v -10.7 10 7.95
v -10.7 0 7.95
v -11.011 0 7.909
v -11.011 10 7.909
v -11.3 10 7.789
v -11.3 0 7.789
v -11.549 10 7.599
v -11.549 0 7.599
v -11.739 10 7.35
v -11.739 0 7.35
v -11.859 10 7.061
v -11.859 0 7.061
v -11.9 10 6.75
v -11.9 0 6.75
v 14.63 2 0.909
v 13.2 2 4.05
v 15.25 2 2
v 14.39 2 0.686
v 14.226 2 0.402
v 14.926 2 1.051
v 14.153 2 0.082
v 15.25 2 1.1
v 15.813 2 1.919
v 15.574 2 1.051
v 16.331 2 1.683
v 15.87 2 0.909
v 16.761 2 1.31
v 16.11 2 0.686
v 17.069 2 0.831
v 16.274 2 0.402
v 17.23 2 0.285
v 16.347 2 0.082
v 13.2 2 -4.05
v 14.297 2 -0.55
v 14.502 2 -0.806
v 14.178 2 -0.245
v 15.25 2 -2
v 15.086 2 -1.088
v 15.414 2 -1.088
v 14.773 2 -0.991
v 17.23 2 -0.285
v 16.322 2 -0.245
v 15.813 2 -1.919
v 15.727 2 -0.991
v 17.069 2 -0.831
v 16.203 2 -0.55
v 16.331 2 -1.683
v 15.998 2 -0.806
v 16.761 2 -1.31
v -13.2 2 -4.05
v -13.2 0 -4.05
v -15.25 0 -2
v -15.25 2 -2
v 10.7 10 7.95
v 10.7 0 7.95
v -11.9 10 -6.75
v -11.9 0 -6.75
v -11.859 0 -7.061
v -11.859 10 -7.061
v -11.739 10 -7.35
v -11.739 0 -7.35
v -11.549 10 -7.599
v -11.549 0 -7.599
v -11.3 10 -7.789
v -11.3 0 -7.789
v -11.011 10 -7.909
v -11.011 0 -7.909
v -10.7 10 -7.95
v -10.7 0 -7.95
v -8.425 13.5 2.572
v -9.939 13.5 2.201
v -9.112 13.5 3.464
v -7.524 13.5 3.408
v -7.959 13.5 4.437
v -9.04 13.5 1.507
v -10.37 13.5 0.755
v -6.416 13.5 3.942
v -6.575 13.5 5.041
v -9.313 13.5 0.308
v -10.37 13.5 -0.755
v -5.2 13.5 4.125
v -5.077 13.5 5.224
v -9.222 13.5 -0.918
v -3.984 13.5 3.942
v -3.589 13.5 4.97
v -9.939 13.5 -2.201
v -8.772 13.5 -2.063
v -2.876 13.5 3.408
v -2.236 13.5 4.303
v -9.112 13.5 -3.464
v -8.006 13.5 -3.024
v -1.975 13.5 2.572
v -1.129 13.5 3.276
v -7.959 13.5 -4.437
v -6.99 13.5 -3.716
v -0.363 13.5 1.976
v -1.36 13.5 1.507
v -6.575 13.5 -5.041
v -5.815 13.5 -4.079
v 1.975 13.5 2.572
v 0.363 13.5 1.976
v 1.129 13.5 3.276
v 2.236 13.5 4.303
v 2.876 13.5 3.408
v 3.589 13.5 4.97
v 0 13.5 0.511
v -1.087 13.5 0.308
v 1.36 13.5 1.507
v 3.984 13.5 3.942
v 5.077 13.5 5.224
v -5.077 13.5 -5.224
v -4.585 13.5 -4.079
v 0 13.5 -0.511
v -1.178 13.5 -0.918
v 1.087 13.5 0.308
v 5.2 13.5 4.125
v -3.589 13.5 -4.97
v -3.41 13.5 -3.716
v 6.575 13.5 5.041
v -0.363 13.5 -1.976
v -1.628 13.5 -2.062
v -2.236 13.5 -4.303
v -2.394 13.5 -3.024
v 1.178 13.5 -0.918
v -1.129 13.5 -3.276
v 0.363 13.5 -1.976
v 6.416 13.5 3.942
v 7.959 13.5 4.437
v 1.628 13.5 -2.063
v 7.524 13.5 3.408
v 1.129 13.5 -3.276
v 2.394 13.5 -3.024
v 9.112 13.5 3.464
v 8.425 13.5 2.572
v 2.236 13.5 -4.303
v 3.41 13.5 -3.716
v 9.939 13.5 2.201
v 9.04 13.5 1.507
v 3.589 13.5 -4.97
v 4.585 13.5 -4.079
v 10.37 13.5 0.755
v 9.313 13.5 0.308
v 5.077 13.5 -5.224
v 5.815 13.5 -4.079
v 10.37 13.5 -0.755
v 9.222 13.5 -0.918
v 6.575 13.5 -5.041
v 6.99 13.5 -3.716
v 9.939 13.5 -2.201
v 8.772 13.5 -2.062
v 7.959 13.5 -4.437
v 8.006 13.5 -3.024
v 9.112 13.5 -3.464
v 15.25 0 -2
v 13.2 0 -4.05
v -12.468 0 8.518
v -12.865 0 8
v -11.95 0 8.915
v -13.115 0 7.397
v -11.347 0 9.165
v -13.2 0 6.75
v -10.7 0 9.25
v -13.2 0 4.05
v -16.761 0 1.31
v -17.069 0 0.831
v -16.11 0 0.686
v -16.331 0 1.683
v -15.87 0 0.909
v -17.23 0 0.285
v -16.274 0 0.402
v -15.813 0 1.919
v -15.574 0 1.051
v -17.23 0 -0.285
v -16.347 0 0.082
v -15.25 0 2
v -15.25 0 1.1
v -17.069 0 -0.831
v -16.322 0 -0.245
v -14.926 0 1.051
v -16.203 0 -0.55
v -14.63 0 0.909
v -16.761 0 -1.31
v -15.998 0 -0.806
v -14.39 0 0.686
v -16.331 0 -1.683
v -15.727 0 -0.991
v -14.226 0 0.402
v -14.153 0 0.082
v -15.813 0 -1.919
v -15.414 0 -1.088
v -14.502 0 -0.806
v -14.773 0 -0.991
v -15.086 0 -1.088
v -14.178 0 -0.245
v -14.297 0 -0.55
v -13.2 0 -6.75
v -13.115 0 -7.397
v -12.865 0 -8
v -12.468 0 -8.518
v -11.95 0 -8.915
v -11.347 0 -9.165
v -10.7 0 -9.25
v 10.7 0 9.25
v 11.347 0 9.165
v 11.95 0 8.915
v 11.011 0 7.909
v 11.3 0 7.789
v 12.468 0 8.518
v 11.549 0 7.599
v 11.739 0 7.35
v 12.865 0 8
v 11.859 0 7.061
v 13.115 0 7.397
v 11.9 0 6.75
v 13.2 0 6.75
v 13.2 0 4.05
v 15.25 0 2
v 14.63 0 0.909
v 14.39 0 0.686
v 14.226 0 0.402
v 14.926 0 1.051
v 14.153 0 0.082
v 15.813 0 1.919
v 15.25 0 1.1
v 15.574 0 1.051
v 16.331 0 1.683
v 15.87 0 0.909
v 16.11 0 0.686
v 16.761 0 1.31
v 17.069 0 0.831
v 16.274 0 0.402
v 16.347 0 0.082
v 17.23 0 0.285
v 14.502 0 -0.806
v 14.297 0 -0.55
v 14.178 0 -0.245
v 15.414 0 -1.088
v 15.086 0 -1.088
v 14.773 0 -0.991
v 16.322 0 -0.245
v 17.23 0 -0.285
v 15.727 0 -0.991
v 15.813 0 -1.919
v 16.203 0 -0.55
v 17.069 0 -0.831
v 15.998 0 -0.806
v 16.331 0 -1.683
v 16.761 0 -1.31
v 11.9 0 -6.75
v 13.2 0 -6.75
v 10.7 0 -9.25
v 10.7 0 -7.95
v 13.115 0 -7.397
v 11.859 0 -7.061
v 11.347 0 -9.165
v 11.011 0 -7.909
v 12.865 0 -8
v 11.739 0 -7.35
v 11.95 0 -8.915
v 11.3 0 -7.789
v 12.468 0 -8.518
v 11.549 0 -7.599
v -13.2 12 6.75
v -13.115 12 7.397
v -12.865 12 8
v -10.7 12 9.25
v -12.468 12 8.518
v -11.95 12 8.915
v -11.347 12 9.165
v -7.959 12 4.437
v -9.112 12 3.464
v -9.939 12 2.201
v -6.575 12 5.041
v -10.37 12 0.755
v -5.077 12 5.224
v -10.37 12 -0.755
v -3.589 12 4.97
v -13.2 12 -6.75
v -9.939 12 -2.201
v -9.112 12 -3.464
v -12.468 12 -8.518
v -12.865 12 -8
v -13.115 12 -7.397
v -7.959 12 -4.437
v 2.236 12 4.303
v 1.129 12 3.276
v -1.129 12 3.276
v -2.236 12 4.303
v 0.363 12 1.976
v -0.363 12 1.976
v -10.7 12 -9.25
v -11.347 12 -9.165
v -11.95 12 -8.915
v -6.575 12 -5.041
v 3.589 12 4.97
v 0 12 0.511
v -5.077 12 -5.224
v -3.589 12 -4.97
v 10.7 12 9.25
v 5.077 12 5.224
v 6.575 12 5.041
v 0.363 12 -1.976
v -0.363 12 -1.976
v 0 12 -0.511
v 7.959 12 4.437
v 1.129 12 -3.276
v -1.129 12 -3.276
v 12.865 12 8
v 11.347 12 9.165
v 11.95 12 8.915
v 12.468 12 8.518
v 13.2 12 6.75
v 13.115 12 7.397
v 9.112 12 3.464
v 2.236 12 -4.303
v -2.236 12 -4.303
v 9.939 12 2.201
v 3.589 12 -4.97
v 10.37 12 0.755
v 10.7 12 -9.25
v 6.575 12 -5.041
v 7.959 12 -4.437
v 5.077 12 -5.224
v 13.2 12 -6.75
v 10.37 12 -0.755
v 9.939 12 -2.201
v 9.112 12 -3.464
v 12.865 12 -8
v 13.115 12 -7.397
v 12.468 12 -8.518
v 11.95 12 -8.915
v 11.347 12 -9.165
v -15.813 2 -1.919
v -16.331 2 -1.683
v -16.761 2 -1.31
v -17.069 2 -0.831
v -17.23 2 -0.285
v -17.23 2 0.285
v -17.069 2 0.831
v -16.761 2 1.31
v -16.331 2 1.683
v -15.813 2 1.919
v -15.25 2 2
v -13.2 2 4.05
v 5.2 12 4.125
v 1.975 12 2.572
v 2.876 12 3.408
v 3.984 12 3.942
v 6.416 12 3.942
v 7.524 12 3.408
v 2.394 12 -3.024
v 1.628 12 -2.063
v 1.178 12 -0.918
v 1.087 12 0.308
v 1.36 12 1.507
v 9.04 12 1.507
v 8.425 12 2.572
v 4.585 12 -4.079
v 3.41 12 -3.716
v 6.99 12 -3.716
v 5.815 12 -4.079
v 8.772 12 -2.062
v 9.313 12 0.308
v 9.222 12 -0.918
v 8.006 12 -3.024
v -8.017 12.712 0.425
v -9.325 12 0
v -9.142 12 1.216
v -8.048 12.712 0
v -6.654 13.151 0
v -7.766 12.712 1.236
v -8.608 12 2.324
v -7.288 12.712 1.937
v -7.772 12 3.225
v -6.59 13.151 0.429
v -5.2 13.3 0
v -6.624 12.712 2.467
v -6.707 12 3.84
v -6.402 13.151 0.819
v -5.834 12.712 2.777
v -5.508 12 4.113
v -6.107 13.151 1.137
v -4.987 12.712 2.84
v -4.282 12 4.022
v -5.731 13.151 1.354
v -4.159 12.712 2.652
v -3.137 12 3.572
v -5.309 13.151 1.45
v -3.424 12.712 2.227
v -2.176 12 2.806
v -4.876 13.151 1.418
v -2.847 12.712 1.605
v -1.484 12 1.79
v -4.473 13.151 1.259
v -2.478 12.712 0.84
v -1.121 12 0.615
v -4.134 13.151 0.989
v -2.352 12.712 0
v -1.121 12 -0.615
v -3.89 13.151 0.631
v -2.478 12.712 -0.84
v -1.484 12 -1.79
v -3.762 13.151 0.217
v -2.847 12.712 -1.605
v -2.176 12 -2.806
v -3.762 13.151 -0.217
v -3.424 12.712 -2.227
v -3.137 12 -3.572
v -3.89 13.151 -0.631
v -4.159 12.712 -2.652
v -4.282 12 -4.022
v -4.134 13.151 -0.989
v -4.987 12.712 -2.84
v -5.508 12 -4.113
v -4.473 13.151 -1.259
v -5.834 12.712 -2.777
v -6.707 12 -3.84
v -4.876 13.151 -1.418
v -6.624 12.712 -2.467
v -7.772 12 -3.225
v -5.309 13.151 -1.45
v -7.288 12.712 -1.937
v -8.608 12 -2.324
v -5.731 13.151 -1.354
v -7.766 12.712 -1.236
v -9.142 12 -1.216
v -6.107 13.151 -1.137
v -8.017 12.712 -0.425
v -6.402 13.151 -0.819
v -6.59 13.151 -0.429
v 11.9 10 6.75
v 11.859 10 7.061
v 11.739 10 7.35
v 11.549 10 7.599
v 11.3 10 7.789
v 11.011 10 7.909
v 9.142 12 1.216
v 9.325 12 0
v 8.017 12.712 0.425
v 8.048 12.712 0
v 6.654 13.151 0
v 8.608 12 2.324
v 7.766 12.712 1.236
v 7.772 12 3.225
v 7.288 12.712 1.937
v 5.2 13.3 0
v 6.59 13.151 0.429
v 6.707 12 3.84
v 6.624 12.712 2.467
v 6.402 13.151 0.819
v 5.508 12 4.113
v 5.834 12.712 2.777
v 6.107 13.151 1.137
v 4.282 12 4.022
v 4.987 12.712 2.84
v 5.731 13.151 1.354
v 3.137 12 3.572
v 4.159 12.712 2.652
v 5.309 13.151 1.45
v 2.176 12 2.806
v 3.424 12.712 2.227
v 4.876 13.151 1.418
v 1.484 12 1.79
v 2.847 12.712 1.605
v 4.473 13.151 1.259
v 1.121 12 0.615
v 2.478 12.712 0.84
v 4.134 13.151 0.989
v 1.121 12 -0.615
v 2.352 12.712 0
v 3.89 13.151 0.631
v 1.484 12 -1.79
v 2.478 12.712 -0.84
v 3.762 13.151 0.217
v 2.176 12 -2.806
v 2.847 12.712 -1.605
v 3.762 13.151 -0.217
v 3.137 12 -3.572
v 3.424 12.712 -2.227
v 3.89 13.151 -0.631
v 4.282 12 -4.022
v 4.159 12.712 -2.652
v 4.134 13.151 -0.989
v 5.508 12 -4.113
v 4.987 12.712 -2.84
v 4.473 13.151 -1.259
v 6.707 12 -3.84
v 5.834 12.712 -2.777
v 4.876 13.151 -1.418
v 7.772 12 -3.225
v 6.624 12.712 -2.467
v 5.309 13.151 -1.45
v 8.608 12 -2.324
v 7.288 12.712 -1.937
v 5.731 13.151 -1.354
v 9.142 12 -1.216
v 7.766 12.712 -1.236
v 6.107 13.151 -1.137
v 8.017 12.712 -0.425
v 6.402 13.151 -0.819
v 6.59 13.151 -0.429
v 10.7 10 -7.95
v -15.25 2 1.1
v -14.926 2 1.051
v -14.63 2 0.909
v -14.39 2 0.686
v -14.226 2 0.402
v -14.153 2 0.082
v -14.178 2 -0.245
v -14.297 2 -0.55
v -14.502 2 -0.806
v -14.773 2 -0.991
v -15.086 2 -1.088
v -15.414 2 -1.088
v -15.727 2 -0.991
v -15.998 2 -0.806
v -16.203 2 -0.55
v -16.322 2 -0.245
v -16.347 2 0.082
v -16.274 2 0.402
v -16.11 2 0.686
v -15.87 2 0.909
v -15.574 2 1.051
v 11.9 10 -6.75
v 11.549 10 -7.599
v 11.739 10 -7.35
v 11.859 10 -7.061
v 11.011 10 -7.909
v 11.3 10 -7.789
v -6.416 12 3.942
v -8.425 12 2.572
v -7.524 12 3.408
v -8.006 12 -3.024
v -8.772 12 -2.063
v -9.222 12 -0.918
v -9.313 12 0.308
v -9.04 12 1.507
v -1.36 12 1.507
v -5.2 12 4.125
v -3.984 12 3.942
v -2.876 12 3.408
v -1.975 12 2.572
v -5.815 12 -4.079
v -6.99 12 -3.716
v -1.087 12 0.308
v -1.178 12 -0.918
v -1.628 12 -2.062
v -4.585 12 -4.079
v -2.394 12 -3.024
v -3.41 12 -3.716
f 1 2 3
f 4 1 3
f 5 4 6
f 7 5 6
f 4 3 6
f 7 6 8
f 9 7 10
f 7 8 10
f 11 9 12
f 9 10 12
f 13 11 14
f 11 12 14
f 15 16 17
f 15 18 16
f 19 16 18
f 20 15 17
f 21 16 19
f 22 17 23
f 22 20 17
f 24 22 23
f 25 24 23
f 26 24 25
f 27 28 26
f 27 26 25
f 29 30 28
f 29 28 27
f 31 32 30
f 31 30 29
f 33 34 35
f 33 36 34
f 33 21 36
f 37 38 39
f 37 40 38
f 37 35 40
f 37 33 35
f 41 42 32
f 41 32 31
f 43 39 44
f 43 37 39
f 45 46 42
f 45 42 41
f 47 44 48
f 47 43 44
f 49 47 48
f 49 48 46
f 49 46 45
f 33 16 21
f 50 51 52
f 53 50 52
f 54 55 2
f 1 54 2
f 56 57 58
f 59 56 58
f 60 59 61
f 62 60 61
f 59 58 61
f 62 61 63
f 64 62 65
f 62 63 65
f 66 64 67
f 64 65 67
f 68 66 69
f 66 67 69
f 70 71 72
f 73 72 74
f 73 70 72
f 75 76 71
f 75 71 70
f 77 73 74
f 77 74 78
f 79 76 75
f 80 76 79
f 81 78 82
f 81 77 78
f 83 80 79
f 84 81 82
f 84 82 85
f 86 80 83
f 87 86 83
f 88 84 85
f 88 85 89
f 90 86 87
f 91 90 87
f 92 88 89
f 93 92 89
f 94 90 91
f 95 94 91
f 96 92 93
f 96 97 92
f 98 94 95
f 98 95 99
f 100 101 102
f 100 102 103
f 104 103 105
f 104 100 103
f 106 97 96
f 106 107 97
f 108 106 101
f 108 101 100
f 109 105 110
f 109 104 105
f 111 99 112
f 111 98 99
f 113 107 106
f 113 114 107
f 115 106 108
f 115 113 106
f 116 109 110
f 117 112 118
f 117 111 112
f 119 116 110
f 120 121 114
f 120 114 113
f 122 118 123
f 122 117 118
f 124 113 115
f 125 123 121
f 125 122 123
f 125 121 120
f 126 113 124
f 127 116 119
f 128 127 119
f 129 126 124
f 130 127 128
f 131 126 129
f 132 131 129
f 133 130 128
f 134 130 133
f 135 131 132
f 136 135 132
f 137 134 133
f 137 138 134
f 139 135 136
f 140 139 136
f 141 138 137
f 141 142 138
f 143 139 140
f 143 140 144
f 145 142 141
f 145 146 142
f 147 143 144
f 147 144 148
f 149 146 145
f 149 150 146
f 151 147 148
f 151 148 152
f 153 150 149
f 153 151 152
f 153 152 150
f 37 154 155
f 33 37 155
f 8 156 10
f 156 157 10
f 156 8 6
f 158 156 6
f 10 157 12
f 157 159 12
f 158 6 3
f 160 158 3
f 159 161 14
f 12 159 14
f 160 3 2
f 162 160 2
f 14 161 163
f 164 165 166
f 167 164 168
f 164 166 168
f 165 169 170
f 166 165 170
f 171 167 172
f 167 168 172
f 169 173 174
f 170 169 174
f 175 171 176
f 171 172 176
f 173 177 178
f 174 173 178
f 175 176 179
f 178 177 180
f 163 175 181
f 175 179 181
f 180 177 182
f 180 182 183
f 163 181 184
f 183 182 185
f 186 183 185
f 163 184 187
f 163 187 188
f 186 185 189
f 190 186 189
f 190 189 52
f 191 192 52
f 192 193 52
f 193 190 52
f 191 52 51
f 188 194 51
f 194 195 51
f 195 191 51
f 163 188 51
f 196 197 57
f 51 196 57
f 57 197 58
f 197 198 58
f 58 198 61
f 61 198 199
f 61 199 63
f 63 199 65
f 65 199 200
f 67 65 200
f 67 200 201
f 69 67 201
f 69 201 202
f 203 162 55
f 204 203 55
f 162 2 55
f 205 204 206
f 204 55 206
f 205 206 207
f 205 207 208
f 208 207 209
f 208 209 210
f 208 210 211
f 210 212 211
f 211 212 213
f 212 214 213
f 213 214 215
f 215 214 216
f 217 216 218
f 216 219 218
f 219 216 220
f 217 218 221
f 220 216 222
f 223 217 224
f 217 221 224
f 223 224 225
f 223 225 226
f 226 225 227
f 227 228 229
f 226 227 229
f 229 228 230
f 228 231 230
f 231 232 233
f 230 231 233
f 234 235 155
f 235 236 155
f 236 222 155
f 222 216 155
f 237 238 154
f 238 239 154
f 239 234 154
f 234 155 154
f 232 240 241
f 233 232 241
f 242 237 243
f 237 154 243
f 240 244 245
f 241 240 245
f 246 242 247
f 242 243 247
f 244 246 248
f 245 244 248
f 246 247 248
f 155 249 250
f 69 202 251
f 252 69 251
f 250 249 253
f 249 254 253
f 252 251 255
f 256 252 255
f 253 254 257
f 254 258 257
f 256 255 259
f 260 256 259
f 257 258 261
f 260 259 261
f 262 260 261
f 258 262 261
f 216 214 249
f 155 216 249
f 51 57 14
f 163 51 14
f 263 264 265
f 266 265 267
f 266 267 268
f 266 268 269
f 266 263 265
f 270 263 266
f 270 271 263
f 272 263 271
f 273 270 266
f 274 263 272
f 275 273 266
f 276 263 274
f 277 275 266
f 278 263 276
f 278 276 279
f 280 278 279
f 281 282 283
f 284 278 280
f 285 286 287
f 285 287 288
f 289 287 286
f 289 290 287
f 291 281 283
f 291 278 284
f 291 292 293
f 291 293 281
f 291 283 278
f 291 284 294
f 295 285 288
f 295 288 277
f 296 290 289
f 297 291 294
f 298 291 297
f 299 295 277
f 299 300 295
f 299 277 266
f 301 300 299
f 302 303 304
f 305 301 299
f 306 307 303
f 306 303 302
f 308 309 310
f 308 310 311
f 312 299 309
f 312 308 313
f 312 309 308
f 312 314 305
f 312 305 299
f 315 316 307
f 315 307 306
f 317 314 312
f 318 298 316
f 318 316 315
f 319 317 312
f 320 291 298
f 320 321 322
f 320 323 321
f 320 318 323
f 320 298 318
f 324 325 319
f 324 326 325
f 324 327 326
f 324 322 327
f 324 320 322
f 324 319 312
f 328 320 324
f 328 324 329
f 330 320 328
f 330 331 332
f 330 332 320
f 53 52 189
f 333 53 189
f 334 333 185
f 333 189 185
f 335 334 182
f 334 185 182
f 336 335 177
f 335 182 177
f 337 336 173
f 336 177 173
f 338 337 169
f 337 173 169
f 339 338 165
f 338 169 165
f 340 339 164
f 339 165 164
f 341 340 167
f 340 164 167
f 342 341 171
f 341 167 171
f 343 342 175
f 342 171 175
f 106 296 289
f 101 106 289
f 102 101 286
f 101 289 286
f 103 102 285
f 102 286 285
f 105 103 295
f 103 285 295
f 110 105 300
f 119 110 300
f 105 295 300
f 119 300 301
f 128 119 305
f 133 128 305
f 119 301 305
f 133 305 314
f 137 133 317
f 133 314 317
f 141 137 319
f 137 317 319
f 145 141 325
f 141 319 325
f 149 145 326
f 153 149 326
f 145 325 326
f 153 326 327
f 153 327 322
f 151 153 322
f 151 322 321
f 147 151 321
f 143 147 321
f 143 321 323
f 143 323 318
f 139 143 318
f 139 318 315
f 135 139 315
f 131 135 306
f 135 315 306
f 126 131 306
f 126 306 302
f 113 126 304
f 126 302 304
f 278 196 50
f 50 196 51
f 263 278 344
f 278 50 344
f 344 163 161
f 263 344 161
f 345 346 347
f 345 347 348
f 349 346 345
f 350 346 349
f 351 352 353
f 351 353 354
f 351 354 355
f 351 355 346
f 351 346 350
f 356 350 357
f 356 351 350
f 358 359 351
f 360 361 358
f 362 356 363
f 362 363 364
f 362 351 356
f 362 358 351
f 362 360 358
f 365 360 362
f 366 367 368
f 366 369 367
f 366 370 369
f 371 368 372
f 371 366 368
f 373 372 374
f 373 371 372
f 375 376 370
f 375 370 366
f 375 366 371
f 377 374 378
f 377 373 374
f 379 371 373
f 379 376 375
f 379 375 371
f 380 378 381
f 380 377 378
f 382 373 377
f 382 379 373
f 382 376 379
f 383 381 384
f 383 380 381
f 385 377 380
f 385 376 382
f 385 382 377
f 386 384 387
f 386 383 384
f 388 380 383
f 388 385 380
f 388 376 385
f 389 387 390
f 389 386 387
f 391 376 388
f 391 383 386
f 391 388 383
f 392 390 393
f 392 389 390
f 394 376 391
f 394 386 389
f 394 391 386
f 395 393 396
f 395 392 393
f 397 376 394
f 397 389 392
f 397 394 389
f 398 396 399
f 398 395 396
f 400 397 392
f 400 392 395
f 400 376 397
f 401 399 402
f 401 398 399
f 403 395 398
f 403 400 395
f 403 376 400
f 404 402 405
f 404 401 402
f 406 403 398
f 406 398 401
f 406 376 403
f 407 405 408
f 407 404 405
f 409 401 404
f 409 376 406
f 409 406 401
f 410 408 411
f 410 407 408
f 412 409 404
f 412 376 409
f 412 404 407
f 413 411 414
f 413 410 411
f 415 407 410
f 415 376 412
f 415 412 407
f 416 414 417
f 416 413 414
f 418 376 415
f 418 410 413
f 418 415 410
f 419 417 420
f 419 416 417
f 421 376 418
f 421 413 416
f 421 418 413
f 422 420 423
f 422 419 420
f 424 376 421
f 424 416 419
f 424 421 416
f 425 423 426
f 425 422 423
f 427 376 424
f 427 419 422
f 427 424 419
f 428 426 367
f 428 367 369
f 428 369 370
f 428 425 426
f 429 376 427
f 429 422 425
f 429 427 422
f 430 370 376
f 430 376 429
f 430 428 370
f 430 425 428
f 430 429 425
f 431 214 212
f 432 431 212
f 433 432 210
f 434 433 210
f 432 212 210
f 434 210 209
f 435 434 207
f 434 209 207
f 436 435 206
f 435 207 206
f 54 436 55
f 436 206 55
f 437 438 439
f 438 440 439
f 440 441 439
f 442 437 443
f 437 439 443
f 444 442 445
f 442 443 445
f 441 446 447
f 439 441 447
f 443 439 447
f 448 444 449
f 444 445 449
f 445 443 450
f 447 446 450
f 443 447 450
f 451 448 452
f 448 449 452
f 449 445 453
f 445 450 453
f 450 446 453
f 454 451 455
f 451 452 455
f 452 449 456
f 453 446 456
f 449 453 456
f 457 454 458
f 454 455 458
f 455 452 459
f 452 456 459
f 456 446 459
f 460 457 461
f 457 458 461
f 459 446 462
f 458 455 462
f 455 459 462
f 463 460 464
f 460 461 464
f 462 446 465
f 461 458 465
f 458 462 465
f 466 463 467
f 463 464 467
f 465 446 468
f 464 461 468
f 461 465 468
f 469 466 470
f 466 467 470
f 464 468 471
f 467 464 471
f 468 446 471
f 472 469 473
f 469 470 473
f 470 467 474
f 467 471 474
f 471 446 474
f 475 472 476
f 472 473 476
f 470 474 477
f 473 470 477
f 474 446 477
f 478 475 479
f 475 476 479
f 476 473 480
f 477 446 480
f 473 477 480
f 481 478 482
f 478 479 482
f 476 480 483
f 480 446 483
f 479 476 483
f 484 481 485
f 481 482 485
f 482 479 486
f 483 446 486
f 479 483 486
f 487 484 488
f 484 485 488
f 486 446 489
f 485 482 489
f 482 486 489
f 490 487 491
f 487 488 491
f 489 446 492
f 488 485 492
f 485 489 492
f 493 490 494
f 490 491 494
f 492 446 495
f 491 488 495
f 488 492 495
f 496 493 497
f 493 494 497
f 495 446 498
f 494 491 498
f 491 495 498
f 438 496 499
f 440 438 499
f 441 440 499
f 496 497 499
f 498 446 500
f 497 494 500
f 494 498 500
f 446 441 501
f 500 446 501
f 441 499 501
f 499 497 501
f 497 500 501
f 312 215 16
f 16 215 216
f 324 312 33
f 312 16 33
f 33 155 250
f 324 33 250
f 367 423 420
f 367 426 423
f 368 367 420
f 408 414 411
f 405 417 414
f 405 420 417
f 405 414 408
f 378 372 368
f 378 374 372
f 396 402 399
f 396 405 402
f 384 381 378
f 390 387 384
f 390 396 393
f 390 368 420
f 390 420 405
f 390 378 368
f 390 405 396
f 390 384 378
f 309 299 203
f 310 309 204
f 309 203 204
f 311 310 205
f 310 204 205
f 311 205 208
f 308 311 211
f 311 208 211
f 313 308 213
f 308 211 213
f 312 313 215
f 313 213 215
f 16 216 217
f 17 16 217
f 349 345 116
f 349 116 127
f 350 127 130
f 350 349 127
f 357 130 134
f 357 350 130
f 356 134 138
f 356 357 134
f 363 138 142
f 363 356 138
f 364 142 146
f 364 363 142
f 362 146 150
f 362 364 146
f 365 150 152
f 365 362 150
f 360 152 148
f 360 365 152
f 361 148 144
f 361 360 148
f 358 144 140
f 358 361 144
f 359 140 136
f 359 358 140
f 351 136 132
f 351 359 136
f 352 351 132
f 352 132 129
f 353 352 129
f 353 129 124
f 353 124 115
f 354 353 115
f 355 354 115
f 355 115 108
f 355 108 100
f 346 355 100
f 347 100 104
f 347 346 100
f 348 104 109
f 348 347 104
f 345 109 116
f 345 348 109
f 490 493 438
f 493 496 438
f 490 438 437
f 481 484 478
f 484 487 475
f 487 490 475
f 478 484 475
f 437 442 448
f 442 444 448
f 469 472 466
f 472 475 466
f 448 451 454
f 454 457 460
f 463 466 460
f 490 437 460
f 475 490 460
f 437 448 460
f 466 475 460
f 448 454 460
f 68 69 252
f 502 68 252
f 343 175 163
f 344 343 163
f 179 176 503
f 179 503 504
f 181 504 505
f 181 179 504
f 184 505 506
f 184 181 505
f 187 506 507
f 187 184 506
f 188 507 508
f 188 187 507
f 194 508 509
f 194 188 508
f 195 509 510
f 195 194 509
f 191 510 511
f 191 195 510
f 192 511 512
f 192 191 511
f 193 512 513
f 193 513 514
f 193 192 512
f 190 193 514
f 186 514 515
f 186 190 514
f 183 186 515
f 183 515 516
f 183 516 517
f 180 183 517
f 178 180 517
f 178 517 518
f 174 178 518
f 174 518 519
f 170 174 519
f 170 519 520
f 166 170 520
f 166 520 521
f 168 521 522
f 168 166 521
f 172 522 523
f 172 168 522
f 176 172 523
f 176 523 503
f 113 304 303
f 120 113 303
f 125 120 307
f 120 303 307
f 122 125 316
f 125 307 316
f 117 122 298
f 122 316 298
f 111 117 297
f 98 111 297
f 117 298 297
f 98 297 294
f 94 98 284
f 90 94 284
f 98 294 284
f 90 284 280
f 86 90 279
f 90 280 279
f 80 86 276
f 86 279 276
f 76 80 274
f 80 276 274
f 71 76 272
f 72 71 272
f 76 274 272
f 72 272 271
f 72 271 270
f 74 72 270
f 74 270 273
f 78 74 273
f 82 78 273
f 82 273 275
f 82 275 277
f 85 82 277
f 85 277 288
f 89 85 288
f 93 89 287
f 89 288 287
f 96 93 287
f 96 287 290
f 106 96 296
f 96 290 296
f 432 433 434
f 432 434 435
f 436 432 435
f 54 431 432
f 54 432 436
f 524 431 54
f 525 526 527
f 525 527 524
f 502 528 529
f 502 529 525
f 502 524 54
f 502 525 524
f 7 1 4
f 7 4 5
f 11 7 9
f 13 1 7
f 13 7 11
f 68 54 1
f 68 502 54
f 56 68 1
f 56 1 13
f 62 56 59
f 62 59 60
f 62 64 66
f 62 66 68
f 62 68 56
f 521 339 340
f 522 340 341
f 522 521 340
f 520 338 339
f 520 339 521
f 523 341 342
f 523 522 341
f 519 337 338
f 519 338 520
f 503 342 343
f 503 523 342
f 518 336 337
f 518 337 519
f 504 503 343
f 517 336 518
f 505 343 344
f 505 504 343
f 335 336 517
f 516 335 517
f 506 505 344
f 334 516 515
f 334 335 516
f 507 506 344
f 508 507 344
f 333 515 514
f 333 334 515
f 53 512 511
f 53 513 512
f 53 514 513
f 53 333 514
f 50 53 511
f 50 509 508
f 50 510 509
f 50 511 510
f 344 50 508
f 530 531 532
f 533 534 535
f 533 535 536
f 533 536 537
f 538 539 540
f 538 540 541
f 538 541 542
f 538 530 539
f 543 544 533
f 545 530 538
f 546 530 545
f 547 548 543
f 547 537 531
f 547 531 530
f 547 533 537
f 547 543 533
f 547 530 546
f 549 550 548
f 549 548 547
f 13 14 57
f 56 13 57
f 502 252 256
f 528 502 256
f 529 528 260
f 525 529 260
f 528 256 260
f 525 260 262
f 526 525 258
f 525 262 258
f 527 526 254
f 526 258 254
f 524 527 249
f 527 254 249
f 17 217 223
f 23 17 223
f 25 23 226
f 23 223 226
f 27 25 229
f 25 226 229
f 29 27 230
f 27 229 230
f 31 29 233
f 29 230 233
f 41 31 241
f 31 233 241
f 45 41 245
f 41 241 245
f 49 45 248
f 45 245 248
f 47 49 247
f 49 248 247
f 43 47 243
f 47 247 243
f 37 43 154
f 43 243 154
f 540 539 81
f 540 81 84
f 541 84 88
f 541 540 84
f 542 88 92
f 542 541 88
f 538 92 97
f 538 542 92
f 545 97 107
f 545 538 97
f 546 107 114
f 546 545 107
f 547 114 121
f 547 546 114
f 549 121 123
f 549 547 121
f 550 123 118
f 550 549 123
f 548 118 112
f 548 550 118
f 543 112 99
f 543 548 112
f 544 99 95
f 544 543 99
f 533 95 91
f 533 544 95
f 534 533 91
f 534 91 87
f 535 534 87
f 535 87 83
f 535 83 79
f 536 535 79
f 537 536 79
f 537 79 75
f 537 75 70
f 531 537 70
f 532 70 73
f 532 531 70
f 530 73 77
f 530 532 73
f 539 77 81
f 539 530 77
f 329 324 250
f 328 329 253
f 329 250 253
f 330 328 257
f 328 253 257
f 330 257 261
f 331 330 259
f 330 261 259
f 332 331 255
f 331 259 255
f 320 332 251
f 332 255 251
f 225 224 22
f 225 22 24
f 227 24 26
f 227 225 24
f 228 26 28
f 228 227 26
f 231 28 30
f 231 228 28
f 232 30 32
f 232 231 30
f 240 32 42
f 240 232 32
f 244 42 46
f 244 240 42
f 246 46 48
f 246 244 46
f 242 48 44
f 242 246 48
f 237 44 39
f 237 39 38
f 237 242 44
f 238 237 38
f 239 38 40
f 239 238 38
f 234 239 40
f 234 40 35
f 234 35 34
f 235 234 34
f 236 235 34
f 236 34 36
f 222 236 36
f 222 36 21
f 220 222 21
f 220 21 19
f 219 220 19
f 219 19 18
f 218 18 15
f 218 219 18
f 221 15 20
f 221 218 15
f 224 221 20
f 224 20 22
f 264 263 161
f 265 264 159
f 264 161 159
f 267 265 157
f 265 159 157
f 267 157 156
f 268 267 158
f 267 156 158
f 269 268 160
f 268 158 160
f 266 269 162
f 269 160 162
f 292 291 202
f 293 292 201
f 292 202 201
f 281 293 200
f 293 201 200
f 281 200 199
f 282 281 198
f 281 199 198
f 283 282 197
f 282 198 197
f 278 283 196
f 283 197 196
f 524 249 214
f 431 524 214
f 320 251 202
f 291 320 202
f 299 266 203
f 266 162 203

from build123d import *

# Parameters (mm, degrees)
SKETCH2_R           = 1.1
BOSS_EXTRUDE1_DEPTH = 2
BOSS_EXTRUDE2_DEPTH = 10
BOSS_EXTRUDE3_START = -2
BOSS_EXTRUDE3_DEPTH = 2
SKETCH5_R           = 4.125
BOSS_EXTRUDE4_DEPTH = 1.5


with BuildPart() as part:
    # Sketch2 → Boss-Extrude1 (new body)
    with BuildSketch(Plane(origin=(0, 0, 0), x_dir=(1, 0, 0), z_dir=(0, 1, 0))):
        with BuildLine():
            Line((-10.7, -9.25), (10.7, -9.25))
            ThreePointArc((10.7, -9.25), (12.467766953, -8.517766953), (13.2, -6.75))
            Line((13.2, -6.75), (13.2, -4.05))
            Line((13.2, -4.05), (15.25, -2))
            ThreePointArc((15.25, -2), (17.25, 0), (15.25, 2))
            Line((15.25, 2), (13.2, 4.05))
            Line((13.2, 4.05), (13.2, 6.75))
            ThreePointArc((13.2, 6.75), (12.467766953, 8.517766953), (10.7, 9.25))
            Line((10.7, 9.25), (-10.7, 9.25))
            ThreePointArc((-10.7, 9.25), (-12.467766953, 8.517766953), (-13.2, 6.75))
            Line((-13.2, 6.75), (-13.2, 4.05))
            Line((-13.2, 4.05), (-15.25, 2))
            ThreePointArc((-15.25, 2), (-17.25, 0), (-15.25, -2))
            Line((-15.25, -2), (-13.2, -4.05))
            Line((-13.2, -4.05), (-13.2, -6.75))
            ThreePointArc((-13.2, -6.75), (-12.467766953, -8.517766953), (-10.7, -9.25))
        make_face()
        with Locations(Location((-15.25, 0, 0), (0, 0, 270))):
            Circle(SKETCH2_R, mode=Mode.SUBTRACT)
        with Locations(Location((15.25, 0, 0), (0, 0, 270))):
            Circle(SKETCH2_R, mode=Mode.SUBTRACT)
        with BuildLine():
            Line((-10.7, 7.95), (10.7, 7.95))
            ThreePointArc((10.7, 7.95), (11.548528137, 7.598528137), (11.9, 6.75))
            Line((11.9, 6.75), (11.9, -6.75))
            ThreePointArc((11.9, -6.75), (11.548528137, -7.598528137), (10.7, -7.95))
            Line((10.7, -7.95), (-10.7, -7.95))
            ThreePointArc((-10.7, -7.95), (-11.548528137, -7.598528137), (-11.9, -6.75))
            Line((-11.9, -6.75), (-11.9, 6.75))
            ThreePointArc((-11.9, 6.75), (-11.548528137, 7.598528137), (-10.7, 7.95))
        make_face(mode=Mode.SUBTRACT)
    extrude(amount=BOSS_EXTRUDE1_DEPTH)

    # Sketch3 → Boss-Extrude2 (add)
    with BuildSketch(Plane(origin=(0, 2, 0), x_dir=(1, 0, 0), z_dir=(0, 1, 0))):
        with BuildLine():
            Line((-13.2, 6.75), (-13.2, -6.75))
            ThreePointArc((-13.2, -6.75), (-12.467766953, -8.517766953), (-10.7, -9.25))
            Line((-10.7, -9.25), (10.7, -9.25))
            ThreePointArc((10.7, -9.25), (12.467766953, -8.517766953), (13.2, -6.75))
            Line((13.2, -6.75), (13.2, 6.75))
            ThreePointArc((13.2, 6.75), (12.467766953, 8.517766953), (10.7, 9.25))
            Line((10.7, 9.25), (-10.7, 9.25))
            ThreePointArc((-10.7, 9.25), (-12.467766953, 8.517766953), (-13.2, 6.75))
        make_face()
        with BuildLine():
            Line((-10.7, 7.95), (10.7, 7.95))
            ThreePointArc((10.7, 7.95), (11.548528137, 7.598528137), (11.9, 6.75))
            Line((11.9, 6.75), (11.9, -6.75))
            ThreePointArc((11.9, -6.75), (11.548528137, -7.598528137), (10.7, -7.95))
            Line((10.7, -7.95), (-10.7, -7.95))
            ThreePointArc((-10.7, -7.95), (-11.548528137, -7.598528137), (-11.9, -6.75))
            Line((-11.9, -6.75), (-11.9, 6.75))
            ThreePointArc((-11.9, 6.75), (-11.548528137, 7.598528137), (-10.7, 7.95))
        make_face(mode=Mode.SUBTRACT)
    extrude(amount=BOSS_EXTRUDE2_DEPTH)

    # Sketch4 → Boss-Extrude3 (add)
    with BuildSketch(Plane(origin=(0, 12, 0), x_dir=(1, 0, 0), z_dir=(0, 1, 0)).offset(BOSS_EXTRUDE3_START)):
        with BuildLine():
            Line((-10.7, 9.25), (10.7, 9.25))
            ThreePointArc((10.7, 9.25), (12.467766953, 8.517766953), (13.2, 6.75))
            Line((13.2, 6.75), (13.2, -6.75))
            ThreePointArc((13.2, -6.75), (12.467766953, -8.517766953), (10.7, -9.25))
            Line((10.7, -9.25), (-10.7, -9.25))
            ThreePointArc((-10.7, -9.25), (-12.467766953, -8.517766953), (-13.2, -6.75))
            Line((-13.2, -6.75), (-13.2, 6.75))
            ThreePointArc((-13.2, 6.75), (-12.467766953, 8.517766953), (-10.7, 9.25))
        make_face()
    extrude(amount=BOSS_EXTRUDE3_DEPTH)

    # Sketch5 → Boss-Extrude4 (add)
    with BuildSketch(Plane(origin=(0, 12, 0), x_dir=(1, 0, 0), z_dir=(0, 1, 0))):
        with BuildLine():
            ThreePointArc((0, 0.510514446), (-10.425, 0), (0, -0.510514446))
            ThreePointArc((0, -0.510514446), (10.425, 0), (0, 0.510514446))
        make_face()
        with Locations(Location((-5.2, 0, 0), (0, 0, 270))):
            Circle(SKETCH5_R, mode=Mode.SUBTRACT)
        with Locations(Location((5.2, 0, 0), (0, 0, 270))):
            Circle(SKETCH5_R, mode=Mode.SUBTRACT)
    extrude(amount=BOSS_EXTRUDE4_DEPTH)


with BuildPart() as body_2:
    # Sketch7 → Revolve1 (revolve)
    with BuildSketch(Plane.XY):
        with BuildLine():
            Line((-5.2, 13.3), (-5.2, 12))
            Line((-5.2, 12), (-9.325, 12))
            ThreePointArc((-9.325, 12), (-7.3625, 12.967307692), (-5.2, 13.3))
        make_face()
    revolve(axis=Axis((-5.2, 13.3, 0), (0, 1, 0)))


with BuildPart() as body_3:
    # Mirror1: mirrored copy
    add(body_2.part.mirror(Plane(origin=(0, 0, 0), x_dir=(0, 0, 1), z_dir=(1, 0, 0))))


solid = Compound([part.part, body_2.part, body_3.part])
